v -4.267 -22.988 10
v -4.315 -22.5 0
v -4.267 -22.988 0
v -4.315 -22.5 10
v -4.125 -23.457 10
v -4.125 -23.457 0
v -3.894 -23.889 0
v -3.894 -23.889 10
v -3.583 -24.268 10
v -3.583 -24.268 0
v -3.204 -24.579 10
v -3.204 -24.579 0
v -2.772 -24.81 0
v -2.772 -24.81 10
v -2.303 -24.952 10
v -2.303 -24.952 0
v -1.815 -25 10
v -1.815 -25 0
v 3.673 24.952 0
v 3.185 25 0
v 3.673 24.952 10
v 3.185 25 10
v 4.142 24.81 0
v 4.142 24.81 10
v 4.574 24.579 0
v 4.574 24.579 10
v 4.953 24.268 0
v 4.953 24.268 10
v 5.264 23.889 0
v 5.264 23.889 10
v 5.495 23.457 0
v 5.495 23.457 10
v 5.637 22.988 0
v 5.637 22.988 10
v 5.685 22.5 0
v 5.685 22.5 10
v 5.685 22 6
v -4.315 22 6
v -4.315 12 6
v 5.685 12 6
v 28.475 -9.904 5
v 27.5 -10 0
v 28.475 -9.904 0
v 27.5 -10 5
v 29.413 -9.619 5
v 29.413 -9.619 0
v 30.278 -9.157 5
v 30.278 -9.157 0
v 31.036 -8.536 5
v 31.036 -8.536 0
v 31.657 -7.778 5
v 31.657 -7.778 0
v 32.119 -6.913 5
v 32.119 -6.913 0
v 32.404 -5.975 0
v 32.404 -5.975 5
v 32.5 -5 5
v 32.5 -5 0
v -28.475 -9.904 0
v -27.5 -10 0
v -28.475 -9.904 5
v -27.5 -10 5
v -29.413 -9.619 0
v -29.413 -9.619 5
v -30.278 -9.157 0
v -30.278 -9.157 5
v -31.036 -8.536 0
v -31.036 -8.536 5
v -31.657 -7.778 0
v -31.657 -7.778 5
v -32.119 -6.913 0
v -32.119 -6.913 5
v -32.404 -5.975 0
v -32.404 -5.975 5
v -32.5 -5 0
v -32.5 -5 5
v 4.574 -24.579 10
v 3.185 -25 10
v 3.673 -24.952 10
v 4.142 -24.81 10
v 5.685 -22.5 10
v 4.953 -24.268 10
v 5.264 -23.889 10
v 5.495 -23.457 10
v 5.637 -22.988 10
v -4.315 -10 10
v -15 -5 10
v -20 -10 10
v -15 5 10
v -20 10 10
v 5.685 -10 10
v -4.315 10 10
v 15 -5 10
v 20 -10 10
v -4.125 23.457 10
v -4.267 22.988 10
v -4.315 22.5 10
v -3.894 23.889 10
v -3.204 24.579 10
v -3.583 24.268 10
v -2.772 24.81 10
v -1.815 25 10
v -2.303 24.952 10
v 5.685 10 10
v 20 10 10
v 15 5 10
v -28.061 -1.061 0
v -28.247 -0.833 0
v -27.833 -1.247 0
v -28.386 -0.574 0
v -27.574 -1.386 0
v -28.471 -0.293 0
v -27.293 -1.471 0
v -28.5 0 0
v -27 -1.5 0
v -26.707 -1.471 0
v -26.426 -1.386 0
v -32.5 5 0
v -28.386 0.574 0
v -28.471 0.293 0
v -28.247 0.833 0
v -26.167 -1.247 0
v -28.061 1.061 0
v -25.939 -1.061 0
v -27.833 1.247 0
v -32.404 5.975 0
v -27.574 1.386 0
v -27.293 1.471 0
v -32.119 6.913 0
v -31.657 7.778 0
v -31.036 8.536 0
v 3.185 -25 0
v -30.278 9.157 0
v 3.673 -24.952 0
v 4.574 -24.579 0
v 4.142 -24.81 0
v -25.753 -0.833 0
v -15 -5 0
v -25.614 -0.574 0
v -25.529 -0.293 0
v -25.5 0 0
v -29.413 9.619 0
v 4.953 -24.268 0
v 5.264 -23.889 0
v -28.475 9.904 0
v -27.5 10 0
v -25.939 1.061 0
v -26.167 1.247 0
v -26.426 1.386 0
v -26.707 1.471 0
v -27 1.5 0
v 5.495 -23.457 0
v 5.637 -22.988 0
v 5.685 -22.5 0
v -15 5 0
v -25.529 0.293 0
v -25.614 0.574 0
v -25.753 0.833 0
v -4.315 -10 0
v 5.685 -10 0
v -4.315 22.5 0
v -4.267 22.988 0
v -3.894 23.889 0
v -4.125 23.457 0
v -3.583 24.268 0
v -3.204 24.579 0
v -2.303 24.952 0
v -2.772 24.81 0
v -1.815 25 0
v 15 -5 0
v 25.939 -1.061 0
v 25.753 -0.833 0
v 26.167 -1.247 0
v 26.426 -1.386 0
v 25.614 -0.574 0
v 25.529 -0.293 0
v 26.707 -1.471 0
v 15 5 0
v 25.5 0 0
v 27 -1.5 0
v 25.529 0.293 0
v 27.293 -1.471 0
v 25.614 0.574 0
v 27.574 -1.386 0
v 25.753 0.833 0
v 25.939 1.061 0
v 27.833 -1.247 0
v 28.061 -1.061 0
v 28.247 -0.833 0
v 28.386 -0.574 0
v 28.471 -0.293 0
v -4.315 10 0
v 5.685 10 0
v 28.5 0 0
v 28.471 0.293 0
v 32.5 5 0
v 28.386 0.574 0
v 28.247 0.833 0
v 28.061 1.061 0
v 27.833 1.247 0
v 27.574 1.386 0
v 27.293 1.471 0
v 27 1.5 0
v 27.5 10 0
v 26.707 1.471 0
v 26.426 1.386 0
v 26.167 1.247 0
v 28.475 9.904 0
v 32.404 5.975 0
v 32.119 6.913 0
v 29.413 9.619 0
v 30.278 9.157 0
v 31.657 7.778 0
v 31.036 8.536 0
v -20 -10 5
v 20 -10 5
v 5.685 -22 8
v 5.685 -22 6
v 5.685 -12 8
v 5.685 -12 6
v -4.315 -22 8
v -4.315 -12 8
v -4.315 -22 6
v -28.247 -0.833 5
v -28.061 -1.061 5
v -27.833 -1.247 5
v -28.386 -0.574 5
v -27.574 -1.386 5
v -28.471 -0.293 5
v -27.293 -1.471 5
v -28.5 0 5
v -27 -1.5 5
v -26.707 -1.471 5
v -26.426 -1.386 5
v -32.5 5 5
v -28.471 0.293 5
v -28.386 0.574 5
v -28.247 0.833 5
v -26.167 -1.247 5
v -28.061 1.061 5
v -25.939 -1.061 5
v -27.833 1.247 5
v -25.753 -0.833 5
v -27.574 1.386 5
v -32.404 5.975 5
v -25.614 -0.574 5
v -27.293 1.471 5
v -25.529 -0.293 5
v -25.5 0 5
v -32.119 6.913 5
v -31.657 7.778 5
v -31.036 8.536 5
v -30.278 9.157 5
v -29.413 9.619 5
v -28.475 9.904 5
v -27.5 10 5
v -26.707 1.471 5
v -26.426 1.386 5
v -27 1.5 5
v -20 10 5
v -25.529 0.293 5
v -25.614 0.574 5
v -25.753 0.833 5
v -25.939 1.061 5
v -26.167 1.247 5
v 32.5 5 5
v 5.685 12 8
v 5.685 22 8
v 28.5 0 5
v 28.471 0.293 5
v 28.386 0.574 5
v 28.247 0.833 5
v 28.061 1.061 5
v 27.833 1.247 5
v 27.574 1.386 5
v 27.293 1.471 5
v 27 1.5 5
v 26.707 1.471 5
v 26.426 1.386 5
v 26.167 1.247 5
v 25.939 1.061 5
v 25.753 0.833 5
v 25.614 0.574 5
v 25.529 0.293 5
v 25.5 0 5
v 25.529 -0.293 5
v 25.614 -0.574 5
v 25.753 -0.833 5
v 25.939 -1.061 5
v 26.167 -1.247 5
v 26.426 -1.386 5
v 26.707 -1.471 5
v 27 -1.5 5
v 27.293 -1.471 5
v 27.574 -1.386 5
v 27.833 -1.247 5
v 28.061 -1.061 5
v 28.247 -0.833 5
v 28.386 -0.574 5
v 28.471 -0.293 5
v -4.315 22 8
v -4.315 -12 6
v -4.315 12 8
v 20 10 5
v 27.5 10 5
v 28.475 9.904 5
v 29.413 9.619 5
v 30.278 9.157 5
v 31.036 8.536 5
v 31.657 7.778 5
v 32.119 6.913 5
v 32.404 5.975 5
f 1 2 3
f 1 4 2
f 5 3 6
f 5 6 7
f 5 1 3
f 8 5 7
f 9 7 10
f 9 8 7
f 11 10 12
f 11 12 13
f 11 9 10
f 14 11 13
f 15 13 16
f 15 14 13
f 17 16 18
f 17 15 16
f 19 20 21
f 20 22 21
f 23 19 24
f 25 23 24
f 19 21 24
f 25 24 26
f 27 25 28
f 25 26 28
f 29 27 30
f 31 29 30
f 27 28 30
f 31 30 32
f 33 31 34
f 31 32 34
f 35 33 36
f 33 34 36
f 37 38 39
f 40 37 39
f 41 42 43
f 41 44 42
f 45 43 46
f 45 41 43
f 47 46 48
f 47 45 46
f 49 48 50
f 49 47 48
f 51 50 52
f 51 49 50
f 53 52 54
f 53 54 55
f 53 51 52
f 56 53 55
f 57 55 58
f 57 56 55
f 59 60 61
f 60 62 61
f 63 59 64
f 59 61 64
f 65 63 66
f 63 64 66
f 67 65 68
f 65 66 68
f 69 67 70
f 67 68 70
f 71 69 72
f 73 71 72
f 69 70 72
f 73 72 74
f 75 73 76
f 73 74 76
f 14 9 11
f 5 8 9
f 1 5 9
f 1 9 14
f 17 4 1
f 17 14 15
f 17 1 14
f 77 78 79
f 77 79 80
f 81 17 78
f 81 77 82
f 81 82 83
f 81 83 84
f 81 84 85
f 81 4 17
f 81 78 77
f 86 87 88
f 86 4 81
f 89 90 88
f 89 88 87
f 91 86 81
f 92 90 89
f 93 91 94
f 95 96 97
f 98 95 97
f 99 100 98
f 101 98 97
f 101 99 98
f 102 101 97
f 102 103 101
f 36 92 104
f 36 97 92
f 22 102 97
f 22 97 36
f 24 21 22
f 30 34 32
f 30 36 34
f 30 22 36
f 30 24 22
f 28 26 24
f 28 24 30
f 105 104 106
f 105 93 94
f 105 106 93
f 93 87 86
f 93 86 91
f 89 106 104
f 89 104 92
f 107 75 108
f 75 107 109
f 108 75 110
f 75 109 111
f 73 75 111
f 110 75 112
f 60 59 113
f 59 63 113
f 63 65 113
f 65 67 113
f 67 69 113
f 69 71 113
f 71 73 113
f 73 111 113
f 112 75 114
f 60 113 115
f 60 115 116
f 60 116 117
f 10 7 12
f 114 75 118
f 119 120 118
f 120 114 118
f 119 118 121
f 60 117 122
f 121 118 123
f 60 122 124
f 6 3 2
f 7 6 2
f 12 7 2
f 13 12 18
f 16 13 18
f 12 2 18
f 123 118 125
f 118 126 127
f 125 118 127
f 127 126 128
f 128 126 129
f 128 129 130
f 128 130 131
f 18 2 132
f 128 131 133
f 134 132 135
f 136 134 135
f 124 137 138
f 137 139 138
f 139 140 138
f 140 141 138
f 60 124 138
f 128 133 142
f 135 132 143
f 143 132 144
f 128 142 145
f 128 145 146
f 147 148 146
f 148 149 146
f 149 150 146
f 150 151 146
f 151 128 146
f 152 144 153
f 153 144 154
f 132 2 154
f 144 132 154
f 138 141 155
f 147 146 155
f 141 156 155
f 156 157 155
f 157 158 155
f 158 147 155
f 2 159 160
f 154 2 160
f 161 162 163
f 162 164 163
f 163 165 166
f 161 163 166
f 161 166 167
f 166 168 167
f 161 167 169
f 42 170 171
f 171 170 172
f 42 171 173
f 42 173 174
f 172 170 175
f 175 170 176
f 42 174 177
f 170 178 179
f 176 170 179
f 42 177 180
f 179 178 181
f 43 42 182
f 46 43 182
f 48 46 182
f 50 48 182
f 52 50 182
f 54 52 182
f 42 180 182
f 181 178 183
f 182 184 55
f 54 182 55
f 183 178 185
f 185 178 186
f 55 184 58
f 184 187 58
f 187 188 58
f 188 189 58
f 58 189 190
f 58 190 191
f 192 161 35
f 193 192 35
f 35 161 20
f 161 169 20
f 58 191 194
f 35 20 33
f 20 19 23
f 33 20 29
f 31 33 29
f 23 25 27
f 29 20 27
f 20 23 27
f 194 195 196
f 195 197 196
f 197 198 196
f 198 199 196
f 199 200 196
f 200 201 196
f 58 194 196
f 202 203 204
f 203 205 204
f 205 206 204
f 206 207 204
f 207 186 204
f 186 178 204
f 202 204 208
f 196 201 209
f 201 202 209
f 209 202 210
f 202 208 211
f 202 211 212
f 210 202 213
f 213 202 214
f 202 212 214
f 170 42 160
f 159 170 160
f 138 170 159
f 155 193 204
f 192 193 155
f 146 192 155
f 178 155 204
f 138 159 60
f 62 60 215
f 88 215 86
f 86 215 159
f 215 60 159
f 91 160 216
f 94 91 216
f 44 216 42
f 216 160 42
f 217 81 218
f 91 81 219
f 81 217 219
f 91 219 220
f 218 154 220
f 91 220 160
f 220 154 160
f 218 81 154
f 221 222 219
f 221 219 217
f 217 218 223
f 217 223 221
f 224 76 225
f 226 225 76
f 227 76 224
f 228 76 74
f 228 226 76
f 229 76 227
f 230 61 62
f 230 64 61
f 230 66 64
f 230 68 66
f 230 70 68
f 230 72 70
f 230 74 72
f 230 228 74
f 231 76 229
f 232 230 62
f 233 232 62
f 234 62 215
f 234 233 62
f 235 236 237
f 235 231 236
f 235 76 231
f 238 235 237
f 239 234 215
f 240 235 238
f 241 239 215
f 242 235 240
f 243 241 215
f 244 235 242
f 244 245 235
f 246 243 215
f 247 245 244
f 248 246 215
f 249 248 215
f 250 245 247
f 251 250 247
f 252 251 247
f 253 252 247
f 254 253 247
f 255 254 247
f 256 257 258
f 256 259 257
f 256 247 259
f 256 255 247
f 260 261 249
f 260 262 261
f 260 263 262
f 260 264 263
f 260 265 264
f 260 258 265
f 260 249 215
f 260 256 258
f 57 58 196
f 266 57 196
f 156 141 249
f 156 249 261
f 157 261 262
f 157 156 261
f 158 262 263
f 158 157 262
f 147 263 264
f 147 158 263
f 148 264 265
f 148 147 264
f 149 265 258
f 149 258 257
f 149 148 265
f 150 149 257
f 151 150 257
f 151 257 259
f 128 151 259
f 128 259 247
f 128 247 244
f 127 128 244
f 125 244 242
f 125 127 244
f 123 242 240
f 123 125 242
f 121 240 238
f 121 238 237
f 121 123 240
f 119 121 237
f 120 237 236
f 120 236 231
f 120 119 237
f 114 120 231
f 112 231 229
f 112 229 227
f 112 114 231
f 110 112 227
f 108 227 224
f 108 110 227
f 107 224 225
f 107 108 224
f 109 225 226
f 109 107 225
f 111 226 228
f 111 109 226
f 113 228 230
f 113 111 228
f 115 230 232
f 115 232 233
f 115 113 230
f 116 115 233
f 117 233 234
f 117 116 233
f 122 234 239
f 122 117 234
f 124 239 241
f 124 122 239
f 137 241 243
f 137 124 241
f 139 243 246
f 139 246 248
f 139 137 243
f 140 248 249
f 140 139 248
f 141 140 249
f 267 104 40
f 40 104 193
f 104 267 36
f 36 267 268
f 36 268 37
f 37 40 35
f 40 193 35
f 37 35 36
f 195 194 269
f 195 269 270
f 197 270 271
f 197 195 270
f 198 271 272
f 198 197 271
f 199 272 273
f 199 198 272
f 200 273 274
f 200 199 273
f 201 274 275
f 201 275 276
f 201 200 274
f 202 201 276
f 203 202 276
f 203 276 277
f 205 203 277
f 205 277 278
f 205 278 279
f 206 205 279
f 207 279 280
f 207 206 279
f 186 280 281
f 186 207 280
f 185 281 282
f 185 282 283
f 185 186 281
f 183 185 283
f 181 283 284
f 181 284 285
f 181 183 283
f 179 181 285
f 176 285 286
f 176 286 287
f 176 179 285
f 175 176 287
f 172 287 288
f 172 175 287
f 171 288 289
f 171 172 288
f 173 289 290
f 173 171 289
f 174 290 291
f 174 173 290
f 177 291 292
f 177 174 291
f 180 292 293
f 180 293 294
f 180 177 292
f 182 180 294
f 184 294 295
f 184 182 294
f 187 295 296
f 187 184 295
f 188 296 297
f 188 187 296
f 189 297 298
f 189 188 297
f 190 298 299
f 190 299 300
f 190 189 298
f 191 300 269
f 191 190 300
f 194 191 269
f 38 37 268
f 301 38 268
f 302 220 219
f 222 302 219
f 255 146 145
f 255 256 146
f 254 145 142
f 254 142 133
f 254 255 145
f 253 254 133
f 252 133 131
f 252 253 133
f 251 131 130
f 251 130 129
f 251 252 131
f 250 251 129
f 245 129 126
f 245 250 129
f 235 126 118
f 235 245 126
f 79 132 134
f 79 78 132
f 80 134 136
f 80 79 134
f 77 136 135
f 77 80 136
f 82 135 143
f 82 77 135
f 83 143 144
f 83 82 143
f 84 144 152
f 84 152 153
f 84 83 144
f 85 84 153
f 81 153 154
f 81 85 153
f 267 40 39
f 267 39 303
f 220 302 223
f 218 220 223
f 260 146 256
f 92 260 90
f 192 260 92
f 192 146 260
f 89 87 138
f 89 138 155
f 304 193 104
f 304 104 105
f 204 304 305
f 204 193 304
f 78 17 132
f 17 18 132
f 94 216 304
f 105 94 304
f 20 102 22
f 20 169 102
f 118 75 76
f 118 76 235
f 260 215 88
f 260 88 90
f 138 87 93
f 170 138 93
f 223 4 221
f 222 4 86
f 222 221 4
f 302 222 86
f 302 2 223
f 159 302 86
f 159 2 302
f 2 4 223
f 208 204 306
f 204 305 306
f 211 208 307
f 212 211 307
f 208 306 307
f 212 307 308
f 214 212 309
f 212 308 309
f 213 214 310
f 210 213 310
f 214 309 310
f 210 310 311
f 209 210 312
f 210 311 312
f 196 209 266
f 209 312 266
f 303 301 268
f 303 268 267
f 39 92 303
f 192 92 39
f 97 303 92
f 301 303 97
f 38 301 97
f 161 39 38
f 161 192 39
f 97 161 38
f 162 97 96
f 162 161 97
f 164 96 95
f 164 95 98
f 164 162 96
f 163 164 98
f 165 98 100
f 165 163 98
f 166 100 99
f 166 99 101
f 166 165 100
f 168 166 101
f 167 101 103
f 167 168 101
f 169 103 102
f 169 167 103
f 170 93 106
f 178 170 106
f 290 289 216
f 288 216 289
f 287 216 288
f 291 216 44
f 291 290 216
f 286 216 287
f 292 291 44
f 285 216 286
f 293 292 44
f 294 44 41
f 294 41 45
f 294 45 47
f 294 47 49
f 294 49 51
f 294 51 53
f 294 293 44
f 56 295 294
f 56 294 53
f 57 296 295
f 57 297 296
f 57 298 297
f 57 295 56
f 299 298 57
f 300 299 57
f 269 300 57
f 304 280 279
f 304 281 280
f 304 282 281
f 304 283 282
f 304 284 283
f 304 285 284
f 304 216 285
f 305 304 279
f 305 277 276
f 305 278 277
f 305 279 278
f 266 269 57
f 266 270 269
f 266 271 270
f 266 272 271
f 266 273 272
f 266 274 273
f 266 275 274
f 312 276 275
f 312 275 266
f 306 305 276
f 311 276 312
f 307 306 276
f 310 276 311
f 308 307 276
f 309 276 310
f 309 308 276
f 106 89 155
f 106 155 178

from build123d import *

# Parameters (mm, degrees)
F0_W     = 10
F0_H     = 20
F0_W_2   = 28.184968
F0_R     = 1.5
F0_W_3   = 26.815032
F0_H_2   = 15
F1_DEPTH = 5
F2_W     = 40
F2_H     = 20
F2_W_2   = 10
F2_H_2   = 15
F3_DEPTH = 5
F4_W     = 10
F4_H     = 2
F5_DEPTH = 10
F6_W     = 30
F6_H     = 10
F7_DEPTH = 25
F8_R     = 5
F9_R     = 2.5


with BuildPart() as f1:
    # F0 (on Top) → F1 (new body)
    with BuildSketch(Plane.XY):
        with Locations((0.684968, 0)):
            Rectangle(F0_W, F0_H)
        with Locations((-18.407516, 0)):
            Rectangle(F0_W_2, F0_H)
        with Locations((-27, 0)):
            Circle(F0_R, mode=Mode.SUBTRACT)
        with Locations((19.092484, 0)):
            Rectangle(F0_W_3, F0_H)
        with Locations((27, 0)):
            Circle(F0_R, mode=Mode.SUBTRACT)
        with Locations((0.684968, 17.5)):
            Rectangle(F0_W, F0_H_2)
        with Locations((0.684968, -17.5)):
            Rectangle(F0_W, F0_H_2)
    extrude(amount=F1_DEPTH)

    # F2 (on face) → F3 (join)
    with BuildSketch(Plane.XY.offset(5)):
        Rectangle(F2_W, F2_H)
        with Locations((0.684968, 17.5)):
            Rectangle(F2_W_2, F2_H_2)
        with Locations((0.684968, -17.5)):
            Rectangle(F2_W_2, F2_H_2)
    extrude(amount=F3_DEPTH)

    # F4 (on face) → F5 (cut)
    with BuildSketch(Plane(origin=(-4.315032, 0, 0), x_dir=(0, -1, 0), z_dir=(-1, 0, 0))):
        with Locations((-17, 7)):
            Rectangle(F4_W, F4_H)
        with Locations((17, 7)):
            Rectangle(F4_W, F4_H)
    extrude(amount=-F5_DEPTH, mode=Mode.SUBTRACT)

    # F6 (on face) → F7 (cut)
    with BuildSketch(Plane.XY.offset(10)):
        Rectangle(F6_W, F6_H)
    extrude(amount=-F7_DEPTH, mode=Mode.SUBTRACT)

    # F8
    f8_edges = [f1.edges().sort_by_distance(p)[0] for p in [
        (-32.5, -10, 2.5),
        (-32.5, 10, 2.5),
        (32.5, 10, 2.5),
        (32.5, -10, 2.5),
    ]]
    fillet(f8_edges, radius=F8_R)

    # F9
    f9_edges = [f1.edges().sort_by_distance(p)[0] for p in [
        (-4.315032, -25, 5),
        (5.684968, -25, 5),
        (5.684968, 25, 5),
        (-4.315032, 25, 5),
    ]]
    fillet(f9_edges, radius=F9_R)


solid = f1.part
